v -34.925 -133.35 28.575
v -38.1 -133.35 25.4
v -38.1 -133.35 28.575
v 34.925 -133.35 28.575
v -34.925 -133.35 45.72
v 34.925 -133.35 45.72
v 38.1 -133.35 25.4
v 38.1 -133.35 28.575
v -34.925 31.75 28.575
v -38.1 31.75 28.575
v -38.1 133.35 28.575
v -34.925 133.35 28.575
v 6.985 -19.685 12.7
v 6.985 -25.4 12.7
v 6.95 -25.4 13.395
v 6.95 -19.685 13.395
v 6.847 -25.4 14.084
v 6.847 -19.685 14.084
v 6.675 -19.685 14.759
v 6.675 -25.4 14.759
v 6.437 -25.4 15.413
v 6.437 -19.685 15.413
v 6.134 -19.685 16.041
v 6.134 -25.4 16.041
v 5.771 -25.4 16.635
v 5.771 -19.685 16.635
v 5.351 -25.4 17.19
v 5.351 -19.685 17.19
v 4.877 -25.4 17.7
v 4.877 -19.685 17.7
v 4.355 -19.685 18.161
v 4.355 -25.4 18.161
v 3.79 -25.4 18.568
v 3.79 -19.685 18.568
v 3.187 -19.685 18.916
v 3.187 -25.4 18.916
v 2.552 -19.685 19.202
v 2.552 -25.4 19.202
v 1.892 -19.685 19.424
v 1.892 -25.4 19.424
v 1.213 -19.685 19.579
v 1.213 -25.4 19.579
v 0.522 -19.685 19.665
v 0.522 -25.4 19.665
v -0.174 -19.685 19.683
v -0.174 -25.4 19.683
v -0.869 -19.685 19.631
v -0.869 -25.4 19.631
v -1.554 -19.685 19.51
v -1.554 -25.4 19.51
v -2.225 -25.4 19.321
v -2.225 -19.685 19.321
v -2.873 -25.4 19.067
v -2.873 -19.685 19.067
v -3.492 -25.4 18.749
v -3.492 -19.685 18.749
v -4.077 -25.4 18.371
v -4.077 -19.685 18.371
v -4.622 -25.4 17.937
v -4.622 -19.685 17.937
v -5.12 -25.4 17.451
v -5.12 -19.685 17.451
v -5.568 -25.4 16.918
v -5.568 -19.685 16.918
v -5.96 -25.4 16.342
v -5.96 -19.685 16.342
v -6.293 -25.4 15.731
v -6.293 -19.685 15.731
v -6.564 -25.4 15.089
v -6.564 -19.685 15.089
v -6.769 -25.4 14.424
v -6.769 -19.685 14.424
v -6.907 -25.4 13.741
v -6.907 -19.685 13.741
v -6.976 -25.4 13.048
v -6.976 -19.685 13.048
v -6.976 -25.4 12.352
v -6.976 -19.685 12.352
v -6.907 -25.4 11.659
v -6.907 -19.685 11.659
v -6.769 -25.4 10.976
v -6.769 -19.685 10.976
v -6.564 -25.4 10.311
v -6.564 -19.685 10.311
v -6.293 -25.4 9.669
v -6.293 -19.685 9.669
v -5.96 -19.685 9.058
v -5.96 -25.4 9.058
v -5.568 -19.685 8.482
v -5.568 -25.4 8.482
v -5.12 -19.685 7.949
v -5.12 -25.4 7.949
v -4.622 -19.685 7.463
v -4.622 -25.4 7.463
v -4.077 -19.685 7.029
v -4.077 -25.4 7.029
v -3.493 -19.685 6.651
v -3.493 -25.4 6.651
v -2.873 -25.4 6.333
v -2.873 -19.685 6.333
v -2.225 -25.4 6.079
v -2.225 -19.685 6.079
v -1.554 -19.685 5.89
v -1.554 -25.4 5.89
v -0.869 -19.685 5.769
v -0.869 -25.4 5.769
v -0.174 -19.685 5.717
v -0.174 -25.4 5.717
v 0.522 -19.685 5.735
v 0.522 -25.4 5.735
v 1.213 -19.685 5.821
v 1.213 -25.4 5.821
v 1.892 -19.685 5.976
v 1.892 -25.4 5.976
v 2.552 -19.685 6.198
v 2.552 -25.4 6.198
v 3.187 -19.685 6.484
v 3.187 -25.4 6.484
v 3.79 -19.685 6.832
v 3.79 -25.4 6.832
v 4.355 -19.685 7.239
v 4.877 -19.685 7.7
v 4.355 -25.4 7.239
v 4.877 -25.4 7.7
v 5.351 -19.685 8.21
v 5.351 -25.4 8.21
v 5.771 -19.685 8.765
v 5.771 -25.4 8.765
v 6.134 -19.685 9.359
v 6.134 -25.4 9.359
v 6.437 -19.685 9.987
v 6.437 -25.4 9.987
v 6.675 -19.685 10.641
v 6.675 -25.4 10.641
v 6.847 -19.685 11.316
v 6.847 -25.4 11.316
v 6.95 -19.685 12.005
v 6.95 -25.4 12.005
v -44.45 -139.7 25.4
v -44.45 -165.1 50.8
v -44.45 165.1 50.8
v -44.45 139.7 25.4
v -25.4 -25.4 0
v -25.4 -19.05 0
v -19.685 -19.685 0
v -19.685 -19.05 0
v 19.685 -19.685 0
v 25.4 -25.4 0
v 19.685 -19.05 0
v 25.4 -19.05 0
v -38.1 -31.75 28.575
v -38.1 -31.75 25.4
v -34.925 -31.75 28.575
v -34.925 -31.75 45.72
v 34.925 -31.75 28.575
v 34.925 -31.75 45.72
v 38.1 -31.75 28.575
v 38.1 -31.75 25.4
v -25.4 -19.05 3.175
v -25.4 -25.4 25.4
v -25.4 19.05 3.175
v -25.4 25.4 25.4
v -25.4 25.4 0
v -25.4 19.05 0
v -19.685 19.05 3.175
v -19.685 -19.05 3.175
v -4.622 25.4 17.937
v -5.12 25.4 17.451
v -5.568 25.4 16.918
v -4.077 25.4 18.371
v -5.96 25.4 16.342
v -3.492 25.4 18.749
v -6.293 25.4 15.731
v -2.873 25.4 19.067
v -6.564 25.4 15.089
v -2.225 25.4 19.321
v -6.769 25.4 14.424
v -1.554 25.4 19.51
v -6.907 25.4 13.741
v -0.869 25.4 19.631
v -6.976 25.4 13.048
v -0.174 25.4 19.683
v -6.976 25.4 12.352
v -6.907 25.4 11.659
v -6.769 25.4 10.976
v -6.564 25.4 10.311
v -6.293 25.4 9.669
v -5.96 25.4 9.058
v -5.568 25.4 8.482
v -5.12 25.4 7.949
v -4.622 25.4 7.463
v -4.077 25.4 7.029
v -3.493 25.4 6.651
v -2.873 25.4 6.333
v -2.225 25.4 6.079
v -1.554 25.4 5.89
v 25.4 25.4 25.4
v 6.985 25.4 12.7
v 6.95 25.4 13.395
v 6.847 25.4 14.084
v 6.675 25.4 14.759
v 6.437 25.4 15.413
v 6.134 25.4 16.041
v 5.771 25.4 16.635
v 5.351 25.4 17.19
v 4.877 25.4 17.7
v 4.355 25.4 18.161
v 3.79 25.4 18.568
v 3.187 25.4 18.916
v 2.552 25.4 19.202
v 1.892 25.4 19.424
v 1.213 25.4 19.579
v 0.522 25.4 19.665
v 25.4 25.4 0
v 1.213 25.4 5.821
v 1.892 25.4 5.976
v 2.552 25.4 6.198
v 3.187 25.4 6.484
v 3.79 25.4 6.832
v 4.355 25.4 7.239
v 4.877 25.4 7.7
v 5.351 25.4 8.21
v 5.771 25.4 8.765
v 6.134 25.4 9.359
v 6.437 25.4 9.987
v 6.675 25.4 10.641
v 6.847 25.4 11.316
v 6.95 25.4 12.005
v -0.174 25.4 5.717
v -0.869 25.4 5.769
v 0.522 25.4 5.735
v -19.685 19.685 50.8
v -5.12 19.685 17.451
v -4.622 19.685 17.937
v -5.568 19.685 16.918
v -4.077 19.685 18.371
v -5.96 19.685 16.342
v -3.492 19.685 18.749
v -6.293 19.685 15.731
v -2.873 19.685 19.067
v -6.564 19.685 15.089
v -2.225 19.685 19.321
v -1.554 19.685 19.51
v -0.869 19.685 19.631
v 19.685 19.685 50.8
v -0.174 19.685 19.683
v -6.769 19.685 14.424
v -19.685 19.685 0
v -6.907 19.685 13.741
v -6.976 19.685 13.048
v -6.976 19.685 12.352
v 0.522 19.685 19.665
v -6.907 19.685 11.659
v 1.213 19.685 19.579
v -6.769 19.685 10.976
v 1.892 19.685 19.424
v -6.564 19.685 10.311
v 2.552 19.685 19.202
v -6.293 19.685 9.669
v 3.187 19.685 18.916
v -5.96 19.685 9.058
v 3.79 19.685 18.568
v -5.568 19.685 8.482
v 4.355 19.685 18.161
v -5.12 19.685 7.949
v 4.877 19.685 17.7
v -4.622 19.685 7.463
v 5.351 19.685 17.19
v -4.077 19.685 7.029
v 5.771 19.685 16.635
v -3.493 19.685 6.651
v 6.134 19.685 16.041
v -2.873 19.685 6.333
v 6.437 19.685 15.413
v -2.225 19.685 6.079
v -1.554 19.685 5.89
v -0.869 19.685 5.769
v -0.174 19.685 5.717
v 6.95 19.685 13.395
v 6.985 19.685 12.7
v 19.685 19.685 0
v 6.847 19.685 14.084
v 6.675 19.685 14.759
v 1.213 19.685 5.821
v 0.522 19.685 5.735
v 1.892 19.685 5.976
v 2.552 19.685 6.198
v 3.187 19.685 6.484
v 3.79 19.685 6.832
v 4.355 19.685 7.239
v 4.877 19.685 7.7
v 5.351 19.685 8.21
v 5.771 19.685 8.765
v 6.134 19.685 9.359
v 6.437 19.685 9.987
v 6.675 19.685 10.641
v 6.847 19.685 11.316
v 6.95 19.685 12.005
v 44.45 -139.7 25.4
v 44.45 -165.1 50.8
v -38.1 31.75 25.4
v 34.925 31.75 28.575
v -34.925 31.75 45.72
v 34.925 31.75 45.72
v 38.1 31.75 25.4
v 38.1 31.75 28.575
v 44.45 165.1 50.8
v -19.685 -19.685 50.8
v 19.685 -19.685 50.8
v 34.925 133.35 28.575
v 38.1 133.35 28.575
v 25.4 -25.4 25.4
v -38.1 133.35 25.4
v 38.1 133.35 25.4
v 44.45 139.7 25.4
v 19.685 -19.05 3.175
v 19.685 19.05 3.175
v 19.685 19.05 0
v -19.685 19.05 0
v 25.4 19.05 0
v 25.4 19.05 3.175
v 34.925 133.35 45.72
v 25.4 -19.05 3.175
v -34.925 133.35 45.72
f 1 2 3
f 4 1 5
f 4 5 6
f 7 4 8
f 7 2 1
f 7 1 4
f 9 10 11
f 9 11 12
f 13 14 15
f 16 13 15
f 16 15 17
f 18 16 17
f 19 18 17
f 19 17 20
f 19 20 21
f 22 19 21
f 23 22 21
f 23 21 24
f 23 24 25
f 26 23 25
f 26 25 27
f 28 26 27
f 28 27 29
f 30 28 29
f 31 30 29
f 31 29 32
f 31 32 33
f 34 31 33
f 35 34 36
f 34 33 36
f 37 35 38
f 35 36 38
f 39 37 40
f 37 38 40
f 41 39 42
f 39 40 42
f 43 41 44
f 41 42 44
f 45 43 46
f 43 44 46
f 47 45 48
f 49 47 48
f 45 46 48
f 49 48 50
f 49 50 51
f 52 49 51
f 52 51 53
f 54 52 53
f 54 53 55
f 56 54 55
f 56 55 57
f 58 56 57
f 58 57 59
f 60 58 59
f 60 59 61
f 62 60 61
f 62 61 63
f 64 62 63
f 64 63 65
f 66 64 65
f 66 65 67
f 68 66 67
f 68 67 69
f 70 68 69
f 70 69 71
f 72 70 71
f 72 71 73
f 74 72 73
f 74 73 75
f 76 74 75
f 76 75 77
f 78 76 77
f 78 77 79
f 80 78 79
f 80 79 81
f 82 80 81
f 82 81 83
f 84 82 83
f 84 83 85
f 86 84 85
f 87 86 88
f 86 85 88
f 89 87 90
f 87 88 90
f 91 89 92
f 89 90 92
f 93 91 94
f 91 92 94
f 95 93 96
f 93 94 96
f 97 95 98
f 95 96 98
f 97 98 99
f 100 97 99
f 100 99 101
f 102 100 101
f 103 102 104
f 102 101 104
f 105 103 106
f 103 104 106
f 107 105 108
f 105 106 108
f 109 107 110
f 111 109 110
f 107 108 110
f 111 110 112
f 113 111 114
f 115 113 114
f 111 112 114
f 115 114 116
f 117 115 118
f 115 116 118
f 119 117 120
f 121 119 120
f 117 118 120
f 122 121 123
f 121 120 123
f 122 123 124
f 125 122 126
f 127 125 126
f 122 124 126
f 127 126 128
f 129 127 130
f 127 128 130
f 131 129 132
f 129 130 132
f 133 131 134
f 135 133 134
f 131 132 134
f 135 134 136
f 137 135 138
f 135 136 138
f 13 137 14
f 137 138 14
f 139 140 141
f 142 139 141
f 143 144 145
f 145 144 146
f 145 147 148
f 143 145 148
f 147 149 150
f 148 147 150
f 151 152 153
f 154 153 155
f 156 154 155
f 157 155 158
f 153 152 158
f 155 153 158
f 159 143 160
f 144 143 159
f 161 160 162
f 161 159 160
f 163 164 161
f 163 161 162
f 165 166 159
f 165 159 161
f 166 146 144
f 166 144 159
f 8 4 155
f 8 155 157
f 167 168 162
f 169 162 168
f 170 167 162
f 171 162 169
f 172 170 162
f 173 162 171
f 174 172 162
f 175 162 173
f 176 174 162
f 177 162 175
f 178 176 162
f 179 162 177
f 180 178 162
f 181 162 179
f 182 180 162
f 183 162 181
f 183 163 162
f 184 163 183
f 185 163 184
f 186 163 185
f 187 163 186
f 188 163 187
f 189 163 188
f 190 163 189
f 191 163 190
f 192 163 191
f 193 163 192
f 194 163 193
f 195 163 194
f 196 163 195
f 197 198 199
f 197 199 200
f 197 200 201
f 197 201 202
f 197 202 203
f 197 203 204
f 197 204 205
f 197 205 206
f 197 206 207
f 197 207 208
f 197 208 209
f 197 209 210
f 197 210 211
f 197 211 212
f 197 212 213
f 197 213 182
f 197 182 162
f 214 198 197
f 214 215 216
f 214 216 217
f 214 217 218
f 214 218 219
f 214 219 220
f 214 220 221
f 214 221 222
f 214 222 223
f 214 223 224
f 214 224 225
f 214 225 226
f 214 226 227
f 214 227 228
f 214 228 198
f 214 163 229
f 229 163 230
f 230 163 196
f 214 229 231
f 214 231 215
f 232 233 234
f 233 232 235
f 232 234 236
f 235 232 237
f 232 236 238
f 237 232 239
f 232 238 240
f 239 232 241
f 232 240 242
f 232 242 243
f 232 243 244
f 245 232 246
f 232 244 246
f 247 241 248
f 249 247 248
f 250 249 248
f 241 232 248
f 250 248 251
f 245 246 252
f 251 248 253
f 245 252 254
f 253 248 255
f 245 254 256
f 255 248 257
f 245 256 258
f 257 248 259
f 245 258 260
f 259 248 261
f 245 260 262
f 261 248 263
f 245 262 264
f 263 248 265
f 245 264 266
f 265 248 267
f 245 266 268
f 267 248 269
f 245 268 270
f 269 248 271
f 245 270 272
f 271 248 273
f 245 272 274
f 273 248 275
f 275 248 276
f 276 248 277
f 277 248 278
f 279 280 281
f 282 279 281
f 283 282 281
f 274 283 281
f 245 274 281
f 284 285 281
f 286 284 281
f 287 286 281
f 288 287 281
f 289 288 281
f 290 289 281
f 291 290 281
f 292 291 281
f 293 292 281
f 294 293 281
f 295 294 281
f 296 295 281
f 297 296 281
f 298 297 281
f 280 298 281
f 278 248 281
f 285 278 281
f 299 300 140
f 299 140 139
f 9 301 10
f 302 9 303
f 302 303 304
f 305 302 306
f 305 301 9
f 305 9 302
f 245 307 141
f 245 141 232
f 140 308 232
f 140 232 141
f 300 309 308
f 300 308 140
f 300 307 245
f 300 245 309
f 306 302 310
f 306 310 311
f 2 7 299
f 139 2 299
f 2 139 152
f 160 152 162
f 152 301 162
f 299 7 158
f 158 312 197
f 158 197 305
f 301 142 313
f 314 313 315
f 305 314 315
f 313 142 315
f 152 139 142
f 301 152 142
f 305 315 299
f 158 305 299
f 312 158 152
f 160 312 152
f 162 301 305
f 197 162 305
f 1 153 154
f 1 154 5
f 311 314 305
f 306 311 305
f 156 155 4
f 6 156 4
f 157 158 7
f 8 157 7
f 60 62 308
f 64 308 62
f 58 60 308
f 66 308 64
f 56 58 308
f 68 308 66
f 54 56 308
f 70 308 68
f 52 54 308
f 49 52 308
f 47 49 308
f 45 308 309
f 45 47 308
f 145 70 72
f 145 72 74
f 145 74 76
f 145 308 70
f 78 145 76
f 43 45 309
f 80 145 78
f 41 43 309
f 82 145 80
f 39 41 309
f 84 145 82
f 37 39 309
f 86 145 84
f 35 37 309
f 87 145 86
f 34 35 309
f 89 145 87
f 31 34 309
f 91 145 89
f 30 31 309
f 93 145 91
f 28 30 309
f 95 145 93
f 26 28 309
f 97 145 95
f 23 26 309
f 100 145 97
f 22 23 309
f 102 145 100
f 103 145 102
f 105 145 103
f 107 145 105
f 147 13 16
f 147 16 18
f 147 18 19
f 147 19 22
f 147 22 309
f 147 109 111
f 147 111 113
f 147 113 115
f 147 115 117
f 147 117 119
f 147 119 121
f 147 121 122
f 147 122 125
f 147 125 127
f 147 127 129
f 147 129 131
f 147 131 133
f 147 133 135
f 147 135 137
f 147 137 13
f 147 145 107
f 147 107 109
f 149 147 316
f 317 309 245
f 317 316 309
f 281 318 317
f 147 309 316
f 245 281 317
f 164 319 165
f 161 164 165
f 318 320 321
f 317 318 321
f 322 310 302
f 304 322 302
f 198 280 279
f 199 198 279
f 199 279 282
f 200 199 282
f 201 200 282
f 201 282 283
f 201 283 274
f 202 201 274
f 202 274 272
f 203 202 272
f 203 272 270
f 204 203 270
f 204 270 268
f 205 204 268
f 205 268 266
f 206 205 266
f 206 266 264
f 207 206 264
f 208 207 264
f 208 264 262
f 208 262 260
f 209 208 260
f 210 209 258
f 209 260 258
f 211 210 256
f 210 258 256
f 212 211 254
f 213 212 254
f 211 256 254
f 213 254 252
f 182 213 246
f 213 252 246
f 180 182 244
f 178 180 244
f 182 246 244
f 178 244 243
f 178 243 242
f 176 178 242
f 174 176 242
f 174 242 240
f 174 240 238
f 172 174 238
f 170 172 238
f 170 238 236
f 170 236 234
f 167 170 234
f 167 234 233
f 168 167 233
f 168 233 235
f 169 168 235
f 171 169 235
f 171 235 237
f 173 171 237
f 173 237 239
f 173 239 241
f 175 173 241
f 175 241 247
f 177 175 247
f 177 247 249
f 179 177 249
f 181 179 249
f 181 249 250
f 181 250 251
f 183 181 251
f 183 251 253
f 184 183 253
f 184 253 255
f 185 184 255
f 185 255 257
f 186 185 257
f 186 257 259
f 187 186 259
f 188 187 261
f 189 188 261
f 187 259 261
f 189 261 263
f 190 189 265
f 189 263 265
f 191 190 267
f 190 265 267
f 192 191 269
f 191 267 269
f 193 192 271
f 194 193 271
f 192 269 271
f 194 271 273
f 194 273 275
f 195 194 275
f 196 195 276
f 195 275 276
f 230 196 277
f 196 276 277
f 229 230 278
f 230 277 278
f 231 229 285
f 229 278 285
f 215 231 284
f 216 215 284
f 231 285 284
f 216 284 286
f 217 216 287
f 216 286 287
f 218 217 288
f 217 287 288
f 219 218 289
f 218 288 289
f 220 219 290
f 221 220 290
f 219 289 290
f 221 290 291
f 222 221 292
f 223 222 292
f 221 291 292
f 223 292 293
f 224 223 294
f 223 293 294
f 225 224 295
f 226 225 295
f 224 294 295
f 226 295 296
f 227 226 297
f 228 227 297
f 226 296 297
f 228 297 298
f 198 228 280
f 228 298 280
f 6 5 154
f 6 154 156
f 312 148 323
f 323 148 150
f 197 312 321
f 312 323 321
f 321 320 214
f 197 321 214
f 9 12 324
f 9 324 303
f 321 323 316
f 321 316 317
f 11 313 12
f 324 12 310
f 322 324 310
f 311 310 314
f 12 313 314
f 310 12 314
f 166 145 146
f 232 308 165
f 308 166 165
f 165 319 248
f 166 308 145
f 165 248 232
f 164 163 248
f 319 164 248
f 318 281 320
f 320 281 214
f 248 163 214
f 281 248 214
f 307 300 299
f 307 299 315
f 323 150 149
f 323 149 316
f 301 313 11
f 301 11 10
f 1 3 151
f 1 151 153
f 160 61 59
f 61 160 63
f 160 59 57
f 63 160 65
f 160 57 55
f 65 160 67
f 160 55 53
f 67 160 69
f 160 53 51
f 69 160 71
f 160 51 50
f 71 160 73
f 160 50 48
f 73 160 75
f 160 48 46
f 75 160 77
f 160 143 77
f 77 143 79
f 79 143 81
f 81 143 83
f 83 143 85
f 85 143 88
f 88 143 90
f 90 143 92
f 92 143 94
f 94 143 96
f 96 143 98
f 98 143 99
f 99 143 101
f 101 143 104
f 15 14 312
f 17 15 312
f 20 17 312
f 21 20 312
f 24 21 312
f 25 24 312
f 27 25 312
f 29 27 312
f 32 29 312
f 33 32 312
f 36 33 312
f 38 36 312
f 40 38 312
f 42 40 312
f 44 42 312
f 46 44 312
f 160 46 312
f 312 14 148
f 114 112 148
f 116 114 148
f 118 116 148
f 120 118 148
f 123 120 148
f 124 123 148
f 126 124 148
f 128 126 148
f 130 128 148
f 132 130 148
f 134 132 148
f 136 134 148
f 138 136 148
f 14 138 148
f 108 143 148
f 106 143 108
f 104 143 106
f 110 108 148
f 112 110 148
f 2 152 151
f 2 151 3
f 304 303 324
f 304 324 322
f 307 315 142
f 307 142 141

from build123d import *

# Parameters (mm, degrees)
F0_W      = 50.8
F0_H      = 50.8
F0_W_2    = 39.37
F0_H_2    = 39.37
F1_DEPTH  = 25.4
F2_R      = 6.985
F3_DEPTH  = 50.801
F4_W      = 88.9
F4_H      = 279.4
F4_W_2    = 39.37
F4_H_2    = 39.37
F5_DEPTH  = 25.4
F6_W      = 76.2
F6_H      = 101.6
F7_DEPTH  = 3.175
F8_W      = 69.85
F8_H      = 101.6
F9_DEPTH  = 17.145
F10_W     = 69.85
F10_H     = 101.6
F11_DEPTH = 17.145
F12_W     = 38.1
F12_H     = 3.175
F13_DEPTH = 69.851
F15_DEPTH = 88.9


with BuildPart() as f1:
    # F0 (on Top) → F1 (new body)
    with BuildSketch(Plane.XY):
        Rectangle(F0_W, F0_H)
        Rectangle(F0_W_2, F0_H_2, mode=Mode.SUBTRACT)
    extrude(amount=F1_DEPTH)

    # F2 (on face) → F3 (cut, through all)
    with BuildSketch(Plane.XZ.offset(25.4)):
        with Locations((0, 12.7)):
            Circle(F2_R)
    extrude(amount=-F3_DEPTH, mode=Mode.SUBTRACT)

    # F4 (on face) → F5 (join)
    with BuildSketch(Plane.XY.offset(25.4)):
        Rectangle(F4_W, F4_H)
        Rectangle(F4_W_2, F4_H_2, mode=Mode.SUBTRACT)
    extrude(amount=F5_DEPTH)

    # F6 (on face) → F7 (cut)
    with BuildSketch(Plane(origin=(0, 0, 25.4), x_dir=(1, 0, 0), z_dir=(0, 0, -1))):
        with Locations((0, -82.55)):
            Rectangle(F6_W, F6_H)
        with Locations((0, 82.55)):
            Rectangle(F6_W, F6_H)
    extrude(amount=-F7_DEPTH, mode=Mode.SUBTRACT)

    # F8 (on face) → F9 (cut)
    with BuildSketch(Plane(origin=(0, 0, 28.575), x_dir=(1, 0, 0), z_dir=(0, 0, -1))):
        with Locations((0, -82.55)):
            Rectangle(F8_W, F8_H)
    extrude(amount=-F9_DEPTH, mode=Mode.SUBTRACT)

    # F10 (on face) → F11 (cut)
    with BuildSketch(Plane(origin=(0, 0, 28.575), x_dir=(1, 0, 0), z_dir=(0, 0, -1))):
        with Locations((0, 82.55)):
            Rectangle(F10_W, F10_H)
    extrude(amount=-F11_DEPTH, mode=Mode.SUBTRACT)

    # F12 (on face) → F13 (cut, through all)
    with BuildSketch(Plane.YZ.offset(25.4)):
        with Locations((0, 1.5875)):
            Rectangle(F12_W, F12_H)
    extrude(amount=-F13_DEPTH, mode=Mode.SUBTRACT)

    # F14 (on face) → F15 (join, through all)
    with BuildSketch(Plane.YZ.offset(44.45)):
        Polygon((-139.7, 25.4), (-139.7, 50.8), (-165.1, 50.8), align=None)
        Polygon((139.7, 50.8), (139.7, 25.4), (165.1, 50.8), align=None)
    extrude(amount=-F15_DEPTH)


solid = f1.part
